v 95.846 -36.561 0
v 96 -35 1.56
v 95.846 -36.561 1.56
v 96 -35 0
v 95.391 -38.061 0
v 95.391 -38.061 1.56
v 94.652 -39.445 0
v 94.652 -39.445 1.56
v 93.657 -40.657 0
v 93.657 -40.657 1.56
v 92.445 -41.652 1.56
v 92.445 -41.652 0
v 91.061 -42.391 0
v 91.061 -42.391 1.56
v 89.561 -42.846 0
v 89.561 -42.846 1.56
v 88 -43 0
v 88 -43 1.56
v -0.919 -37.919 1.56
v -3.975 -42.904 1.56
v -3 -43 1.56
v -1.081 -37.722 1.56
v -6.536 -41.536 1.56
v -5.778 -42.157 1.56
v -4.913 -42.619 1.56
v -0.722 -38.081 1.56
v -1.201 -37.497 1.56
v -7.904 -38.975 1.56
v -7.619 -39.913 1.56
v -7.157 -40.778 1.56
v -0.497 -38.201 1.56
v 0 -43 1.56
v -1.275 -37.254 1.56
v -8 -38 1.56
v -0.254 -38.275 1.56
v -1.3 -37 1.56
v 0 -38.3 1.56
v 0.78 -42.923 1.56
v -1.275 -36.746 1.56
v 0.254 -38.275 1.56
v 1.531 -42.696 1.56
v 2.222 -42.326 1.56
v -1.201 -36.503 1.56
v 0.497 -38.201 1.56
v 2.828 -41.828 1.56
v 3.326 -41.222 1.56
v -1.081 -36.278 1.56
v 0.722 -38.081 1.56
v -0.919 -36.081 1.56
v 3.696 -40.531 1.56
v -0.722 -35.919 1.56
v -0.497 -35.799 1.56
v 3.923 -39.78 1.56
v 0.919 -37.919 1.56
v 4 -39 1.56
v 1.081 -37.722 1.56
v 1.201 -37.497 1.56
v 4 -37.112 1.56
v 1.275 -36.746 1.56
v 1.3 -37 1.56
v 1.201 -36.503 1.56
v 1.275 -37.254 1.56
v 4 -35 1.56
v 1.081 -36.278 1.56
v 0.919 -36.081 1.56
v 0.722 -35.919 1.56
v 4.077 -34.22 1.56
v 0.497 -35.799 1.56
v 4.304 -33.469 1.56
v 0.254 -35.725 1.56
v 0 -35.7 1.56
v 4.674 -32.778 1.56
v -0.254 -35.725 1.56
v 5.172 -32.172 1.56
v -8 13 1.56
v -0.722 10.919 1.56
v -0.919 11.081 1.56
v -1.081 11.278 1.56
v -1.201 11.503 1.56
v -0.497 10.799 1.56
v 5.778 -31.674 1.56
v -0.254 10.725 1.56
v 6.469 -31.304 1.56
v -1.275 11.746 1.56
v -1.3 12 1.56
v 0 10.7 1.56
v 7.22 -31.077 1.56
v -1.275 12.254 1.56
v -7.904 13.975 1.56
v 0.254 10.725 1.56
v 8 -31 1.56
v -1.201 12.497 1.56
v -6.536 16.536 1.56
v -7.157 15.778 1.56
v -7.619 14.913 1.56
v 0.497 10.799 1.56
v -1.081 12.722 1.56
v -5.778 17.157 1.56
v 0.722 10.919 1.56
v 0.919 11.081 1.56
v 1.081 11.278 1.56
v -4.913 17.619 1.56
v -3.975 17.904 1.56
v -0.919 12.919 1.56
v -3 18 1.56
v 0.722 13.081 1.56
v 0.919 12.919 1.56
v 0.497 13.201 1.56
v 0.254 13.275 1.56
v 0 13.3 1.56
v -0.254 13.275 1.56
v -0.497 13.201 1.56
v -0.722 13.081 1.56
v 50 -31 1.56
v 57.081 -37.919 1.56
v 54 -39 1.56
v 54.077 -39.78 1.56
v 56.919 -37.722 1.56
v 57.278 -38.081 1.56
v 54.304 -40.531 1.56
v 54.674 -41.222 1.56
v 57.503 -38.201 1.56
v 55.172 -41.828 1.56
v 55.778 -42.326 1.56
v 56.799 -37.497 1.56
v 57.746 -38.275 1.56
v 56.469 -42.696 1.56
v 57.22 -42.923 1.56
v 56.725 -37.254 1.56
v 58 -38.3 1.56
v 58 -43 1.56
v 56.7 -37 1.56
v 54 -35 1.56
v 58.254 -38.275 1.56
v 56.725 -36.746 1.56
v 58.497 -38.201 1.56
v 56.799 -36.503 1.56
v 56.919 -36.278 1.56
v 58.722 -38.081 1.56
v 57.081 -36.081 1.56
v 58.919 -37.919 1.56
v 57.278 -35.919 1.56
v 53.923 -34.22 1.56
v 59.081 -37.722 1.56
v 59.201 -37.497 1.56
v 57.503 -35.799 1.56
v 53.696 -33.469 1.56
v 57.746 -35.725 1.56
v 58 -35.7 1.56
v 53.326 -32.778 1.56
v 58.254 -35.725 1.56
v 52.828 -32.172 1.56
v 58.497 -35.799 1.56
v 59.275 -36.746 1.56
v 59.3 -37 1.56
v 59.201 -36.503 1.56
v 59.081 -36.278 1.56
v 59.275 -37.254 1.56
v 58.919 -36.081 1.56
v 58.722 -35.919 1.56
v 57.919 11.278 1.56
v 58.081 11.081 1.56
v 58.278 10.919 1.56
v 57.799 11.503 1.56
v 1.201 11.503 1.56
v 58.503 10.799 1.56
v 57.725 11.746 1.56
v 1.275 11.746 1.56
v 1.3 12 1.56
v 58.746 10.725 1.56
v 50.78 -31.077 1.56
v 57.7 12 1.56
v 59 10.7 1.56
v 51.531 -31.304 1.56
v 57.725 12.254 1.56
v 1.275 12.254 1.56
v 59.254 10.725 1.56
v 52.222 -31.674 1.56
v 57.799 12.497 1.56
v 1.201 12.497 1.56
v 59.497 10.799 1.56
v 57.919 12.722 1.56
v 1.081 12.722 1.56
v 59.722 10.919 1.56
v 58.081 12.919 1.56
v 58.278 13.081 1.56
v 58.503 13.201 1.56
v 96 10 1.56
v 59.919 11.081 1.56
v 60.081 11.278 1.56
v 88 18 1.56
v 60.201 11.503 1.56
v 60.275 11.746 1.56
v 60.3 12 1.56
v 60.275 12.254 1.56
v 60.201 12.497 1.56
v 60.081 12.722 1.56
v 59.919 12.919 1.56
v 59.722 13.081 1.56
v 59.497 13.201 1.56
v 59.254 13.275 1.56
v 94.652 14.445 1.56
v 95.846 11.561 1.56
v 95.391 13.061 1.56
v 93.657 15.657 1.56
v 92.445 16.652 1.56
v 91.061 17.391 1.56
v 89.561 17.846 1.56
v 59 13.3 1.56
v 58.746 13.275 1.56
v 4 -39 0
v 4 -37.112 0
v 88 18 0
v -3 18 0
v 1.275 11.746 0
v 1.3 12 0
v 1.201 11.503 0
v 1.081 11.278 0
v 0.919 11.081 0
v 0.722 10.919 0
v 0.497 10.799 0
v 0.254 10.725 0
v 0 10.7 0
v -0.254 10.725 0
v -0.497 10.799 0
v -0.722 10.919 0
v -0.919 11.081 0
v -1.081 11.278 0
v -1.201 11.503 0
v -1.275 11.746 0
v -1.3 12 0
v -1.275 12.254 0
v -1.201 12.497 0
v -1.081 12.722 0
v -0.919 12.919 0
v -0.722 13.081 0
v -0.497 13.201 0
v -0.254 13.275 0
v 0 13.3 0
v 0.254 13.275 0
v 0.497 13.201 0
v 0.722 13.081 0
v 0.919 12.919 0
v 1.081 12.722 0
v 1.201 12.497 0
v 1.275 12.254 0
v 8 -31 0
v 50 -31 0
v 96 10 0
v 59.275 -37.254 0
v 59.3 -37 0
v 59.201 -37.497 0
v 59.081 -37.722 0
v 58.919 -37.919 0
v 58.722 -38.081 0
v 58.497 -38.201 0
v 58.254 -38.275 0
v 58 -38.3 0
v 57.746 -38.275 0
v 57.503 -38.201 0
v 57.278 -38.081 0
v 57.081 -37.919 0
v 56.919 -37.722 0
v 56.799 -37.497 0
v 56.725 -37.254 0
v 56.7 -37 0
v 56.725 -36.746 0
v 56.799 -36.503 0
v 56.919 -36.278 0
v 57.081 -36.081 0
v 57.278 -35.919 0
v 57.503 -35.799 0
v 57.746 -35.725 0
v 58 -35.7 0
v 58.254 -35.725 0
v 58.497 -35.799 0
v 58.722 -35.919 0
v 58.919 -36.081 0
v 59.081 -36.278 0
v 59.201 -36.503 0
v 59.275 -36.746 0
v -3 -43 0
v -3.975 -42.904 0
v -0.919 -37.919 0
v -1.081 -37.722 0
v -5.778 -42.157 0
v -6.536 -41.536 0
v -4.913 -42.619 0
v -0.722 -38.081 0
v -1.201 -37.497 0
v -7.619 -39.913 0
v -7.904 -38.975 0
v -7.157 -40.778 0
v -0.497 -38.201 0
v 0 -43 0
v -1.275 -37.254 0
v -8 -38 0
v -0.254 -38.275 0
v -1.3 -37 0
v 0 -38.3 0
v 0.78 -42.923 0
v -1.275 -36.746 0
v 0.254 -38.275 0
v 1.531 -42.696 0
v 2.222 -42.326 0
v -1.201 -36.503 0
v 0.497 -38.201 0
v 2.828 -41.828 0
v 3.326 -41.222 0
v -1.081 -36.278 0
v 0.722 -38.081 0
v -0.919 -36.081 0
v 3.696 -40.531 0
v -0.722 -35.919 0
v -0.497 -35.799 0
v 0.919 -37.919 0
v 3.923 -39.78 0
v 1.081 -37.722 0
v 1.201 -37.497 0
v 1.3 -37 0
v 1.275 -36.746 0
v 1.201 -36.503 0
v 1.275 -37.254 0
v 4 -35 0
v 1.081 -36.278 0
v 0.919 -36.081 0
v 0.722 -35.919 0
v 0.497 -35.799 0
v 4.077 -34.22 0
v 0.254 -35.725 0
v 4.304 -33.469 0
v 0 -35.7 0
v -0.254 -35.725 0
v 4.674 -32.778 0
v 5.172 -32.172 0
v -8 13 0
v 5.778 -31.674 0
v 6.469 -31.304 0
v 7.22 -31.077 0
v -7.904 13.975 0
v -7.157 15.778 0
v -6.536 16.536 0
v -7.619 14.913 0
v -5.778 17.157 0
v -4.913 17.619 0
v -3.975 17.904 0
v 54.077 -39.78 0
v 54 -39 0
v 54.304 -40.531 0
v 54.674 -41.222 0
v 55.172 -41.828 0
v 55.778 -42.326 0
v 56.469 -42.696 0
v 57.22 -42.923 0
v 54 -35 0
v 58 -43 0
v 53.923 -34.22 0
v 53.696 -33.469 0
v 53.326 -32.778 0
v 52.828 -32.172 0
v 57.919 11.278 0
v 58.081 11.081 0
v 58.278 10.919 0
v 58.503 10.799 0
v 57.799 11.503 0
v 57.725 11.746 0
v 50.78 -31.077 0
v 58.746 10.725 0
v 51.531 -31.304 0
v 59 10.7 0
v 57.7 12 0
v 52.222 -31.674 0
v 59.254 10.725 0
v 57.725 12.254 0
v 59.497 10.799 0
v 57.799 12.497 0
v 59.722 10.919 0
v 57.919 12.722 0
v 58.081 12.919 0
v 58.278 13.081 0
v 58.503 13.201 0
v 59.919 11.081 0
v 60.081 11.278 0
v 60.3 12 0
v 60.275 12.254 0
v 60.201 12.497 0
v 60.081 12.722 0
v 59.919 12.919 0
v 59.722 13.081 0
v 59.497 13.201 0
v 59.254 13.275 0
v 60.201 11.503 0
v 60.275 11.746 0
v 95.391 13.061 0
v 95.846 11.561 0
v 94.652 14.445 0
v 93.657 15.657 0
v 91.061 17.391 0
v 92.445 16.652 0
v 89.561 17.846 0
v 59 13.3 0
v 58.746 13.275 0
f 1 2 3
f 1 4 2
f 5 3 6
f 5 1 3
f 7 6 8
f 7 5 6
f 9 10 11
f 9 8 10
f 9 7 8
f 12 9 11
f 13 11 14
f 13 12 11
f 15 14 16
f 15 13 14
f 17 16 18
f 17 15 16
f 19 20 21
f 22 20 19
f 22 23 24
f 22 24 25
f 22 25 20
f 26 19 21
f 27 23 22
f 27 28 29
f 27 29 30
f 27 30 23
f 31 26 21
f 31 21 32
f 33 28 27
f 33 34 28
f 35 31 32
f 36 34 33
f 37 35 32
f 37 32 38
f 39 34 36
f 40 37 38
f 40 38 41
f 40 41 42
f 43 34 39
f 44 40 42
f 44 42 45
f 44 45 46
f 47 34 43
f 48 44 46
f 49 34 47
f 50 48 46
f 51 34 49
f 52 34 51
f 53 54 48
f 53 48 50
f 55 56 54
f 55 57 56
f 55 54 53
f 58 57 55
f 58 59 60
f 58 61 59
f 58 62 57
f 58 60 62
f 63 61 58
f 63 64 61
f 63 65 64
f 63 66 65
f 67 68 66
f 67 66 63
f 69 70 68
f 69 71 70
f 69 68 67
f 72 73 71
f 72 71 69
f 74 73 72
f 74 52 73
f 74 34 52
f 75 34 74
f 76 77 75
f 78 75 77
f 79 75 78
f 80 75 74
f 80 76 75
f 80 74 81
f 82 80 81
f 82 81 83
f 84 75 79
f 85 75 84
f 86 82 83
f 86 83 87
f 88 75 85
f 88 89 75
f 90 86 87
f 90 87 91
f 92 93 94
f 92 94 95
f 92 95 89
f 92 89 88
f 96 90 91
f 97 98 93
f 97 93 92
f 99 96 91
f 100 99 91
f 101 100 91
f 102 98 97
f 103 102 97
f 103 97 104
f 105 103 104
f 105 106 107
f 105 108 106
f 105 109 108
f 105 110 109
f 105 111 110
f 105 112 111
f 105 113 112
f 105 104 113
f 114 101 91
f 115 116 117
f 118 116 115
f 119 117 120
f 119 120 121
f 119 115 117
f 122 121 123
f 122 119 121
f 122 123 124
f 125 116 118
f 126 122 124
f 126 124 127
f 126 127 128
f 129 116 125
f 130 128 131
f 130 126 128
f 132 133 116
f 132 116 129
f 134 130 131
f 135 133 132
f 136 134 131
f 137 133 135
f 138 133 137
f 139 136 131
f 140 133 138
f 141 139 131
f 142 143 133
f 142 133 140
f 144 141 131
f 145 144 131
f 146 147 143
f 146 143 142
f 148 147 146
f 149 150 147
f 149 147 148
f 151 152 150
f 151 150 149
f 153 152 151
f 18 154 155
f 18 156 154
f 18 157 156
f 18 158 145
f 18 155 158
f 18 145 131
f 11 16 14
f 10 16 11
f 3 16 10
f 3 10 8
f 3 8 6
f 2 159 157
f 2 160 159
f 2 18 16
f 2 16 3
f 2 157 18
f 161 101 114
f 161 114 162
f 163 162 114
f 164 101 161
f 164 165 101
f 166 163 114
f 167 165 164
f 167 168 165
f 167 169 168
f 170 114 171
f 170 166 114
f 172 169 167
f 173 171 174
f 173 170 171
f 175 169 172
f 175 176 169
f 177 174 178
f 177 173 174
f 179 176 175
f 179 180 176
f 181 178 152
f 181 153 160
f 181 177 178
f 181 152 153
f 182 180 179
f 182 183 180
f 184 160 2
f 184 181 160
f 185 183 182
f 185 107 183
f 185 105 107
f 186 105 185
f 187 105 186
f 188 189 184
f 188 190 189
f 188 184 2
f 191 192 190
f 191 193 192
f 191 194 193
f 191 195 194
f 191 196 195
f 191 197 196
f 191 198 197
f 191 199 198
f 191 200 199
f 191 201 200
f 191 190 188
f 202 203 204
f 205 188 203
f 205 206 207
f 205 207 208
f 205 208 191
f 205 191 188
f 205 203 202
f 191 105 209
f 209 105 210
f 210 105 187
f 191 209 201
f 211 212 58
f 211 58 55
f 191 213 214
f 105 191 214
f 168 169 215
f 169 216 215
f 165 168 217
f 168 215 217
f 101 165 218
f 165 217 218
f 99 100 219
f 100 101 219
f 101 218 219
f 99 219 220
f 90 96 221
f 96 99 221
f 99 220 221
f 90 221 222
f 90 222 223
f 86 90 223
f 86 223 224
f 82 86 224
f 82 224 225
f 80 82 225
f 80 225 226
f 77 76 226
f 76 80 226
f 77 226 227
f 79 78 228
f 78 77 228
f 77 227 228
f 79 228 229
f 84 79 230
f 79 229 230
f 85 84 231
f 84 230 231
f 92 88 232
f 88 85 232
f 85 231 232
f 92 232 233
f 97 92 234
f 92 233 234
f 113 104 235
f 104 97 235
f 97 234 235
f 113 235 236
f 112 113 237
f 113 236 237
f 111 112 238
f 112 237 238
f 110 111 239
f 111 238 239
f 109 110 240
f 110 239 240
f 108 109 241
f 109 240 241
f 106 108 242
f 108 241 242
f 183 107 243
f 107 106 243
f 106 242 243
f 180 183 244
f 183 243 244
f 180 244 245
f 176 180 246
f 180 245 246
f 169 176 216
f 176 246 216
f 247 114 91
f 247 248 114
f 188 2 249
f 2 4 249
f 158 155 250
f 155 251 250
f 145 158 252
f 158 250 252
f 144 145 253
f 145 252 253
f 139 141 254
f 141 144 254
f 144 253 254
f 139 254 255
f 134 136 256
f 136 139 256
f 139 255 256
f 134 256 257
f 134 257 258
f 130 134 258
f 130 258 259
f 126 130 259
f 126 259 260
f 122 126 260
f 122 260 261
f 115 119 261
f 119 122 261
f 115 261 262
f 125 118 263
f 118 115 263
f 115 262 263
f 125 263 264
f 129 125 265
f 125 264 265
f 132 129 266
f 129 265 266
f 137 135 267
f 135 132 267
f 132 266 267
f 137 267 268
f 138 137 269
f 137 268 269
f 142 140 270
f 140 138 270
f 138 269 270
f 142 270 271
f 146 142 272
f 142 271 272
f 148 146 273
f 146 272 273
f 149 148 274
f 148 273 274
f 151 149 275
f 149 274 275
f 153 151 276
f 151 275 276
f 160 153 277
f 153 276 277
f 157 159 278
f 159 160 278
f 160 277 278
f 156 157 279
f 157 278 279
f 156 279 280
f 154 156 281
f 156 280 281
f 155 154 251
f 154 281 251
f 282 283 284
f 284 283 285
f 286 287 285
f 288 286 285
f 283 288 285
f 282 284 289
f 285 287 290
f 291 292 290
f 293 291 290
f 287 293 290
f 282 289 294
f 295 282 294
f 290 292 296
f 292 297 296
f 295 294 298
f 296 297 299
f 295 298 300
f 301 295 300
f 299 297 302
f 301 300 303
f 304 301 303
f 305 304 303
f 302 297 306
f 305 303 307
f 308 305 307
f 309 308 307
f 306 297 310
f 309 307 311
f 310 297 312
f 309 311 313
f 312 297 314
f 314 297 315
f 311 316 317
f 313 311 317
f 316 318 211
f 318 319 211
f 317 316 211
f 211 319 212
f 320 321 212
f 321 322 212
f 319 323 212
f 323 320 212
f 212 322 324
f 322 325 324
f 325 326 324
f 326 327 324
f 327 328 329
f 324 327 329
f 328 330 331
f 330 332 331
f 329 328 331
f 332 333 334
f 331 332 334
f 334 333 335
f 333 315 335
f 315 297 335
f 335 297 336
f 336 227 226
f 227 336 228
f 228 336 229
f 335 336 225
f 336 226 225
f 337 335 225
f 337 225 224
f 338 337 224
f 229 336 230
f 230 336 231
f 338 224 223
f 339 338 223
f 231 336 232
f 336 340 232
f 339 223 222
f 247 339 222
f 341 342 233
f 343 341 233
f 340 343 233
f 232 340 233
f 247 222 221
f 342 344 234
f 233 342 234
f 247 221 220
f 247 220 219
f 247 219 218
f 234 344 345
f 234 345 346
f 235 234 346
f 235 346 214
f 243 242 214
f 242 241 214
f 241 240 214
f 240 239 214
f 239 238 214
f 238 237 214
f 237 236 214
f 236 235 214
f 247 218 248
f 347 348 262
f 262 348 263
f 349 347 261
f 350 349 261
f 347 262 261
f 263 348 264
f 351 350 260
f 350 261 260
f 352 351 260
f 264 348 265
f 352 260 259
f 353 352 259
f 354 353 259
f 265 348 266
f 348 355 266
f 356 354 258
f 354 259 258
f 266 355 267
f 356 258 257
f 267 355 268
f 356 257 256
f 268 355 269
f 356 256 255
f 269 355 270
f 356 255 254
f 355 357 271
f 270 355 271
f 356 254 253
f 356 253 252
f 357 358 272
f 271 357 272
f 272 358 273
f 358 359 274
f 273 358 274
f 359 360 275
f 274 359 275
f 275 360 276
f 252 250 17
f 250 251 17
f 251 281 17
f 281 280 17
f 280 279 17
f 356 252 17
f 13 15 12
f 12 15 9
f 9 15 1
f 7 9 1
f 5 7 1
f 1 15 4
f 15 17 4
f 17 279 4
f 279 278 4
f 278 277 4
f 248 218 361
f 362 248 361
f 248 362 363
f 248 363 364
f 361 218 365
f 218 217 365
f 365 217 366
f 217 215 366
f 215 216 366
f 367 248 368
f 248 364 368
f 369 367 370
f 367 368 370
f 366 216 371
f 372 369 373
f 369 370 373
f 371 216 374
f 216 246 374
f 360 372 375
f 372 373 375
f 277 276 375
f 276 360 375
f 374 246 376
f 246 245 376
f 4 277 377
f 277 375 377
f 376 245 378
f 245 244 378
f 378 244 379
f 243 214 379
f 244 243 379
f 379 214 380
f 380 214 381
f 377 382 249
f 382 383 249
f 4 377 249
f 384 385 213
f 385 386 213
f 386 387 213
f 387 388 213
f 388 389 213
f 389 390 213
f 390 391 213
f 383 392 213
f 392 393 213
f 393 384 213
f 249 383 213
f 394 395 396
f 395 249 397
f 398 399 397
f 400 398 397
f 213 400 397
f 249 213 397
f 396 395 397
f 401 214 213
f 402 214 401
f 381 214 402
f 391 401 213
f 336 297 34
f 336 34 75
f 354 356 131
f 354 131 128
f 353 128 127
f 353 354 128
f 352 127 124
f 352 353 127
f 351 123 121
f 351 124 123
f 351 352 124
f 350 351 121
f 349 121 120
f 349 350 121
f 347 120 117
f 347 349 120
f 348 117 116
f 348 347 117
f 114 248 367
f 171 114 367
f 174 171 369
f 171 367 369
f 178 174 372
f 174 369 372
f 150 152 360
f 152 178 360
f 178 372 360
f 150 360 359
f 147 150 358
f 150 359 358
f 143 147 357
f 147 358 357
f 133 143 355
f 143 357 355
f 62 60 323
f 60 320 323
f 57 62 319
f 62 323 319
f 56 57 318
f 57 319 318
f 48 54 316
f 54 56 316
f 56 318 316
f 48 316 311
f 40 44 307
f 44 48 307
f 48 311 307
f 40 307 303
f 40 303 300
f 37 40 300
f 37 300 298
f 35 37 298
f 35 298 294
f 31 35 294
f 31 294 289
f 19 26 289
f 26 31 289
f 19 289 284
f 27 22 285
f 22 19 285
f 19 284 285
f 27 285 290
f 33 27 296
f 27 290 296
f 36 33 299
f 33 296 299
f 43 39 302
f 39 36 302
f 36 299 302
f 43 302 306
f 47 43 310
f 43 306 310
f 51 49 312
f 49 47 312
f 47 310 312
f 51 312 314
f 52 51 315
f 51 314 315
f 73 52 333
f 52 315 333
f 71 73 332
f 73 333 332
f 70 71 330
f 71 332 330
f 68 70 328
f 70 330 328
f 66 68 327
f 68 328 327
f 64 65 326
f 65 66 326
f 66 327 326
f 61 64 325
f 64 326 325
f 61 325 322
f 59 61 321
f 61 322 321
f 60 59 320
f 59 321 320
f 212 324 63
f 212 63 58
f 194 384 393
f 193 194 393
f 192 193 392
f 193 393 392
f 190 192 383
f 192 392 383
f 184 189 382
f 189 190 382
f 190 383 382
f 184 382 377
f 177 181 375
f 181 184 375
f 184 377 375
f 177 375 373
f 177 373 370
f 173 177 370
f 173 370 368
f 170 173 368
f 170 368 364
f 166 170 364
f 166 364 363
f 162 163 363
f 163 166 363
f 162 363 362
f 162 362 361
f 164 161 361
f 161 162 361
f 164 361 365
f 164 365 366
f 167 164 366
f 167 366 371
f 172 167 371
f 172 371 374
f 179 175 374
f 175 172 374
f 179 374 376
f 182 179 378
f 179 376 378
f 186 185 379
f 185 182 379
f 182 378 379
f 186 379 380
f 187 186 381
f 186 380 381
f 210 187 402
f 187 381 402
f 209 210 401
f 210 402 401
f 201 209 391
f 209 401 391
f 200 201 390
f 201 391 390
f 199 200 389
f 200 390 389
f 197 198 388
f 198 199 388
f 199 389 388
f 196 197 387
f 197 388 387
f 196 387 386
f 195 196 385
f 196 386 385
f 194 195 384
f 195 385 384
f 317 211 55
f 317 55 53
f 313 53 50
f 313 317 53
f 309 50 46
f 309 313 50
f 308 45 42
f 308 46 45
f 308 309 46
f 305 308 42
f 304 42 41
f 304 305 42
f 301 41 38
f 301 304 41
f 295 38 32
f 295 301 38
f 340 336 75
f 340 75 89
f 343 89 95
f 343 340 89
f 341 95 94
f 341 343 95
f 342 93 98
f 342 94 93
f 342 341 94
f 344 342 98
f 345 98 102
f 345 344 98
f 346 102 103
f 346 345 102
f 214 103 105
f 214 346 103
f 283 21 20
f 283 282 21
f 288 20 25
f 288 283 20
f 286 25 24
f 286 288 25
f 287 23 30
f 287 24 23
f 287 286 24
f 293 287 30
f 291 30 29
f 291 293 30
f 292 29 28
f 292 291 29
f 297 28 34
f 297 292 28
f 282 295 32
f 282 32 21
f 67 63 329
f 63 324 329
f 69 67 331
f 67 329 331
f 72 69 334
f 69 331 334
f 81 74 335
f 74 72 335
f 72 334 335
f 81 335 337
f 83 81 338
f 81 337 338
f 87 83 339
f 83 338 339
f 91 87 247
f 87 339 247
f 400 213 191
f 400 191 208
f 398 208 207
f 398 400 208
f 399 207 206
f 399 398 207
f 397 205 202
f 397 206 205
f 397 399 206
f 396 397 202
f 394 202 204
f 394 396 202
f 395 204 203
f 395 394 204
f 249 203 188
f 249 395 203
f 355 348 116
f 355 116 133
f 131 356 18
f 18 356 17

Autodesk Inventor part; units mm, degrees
ref_plane "YZ Plane" through (0, 0, 0) normal (1, 0, 0) x (0, 1, 0)
ref_plane "XZ Plane" through (0, 0, 0) normal (0, 1, 0) x (-1, 0, 0)
ref_plane "XY Plane" through (0, 0, 0) normal (0, 0, 1) x (1, 0, 0)
sketch "Sketch1" plane through (0, 0, 0) normal (0, 0, 1) x (1, 0, 0)
  line L0 (96, -35) -> (96, 10)
  arc A0 (88, -43) -> (96, -35) centre (88, -35) ccw
  line L1 (54, -39) -> (54, -35)
  line L2 (50, -31) -> (8, -31)
  line L3 (4, -35) -> (4, -37.1118)
  line L4 (58, -43) -> (88, -43)
  arc A1 (8, -31) -> (4, -35) centre (8, -35) ccw
  arc A2 (54, -39) -> (58, -43) centre (58, -39) ccw
  arc A3 (54, -35) -> (50, -31) centre (50, -35) ccw
  line L5 (-34, 0) -> (96, 0) construction
  line L6 (88, 18) -> (-3, 18)
  circle A4 centre (59, 12) radius 1.3
  circle A5 centre (58, -37) radius 1.3
  line L7 (4, -37.1118) -> (4, -39)
  arc A6 (0, -43) -> (4, -39) centre (0, -39) ccw
  circle A7 centre (0, -37) radius 1.3
  line L8 (58, -37) -> (0, -37) construction
  line L9 (0, 0) -> (0, 18) construction
  line L10 (0, -43) -> (-3, -43)
  line L11 (-8, -38) -> (-8, 13)
  arc A8 (-3, 18) -> (-8, 13) centre (-3, 13) ccw
  arc A9 (-8, -38) -> (-3, -43) centre (-3, -38) ccw
  arc A10 (96, 10) -> (88, 18) centre (88, 10) ccw
  circle A11 centre (0, 12) radius 1.3
  point P0 (4, -43)
  point P1 (96, 18)
  point P2 (54, -31)
  point P3 (4, -31)
  dimension "d8" = 50
  dimension "d11" = 12
  dimension "d13" = 4
  dimension "d16" = 42
  dimension "d33" = 4
  dimension "d44" = 58
  dimension "d46" = 31
  dimension "d47" = 18
  dimension "d51" = 5
  dimension "d52" = 12
  dimension "d55" = 58
  dimension "d57" = 49
  dimension "d58" = 6
  dimension "d59" = 37
  dimension "d60" = 2.6
  dimension "d61" = 8
  dimension "d62" = 8
  dimension "d64" = 4
extrude "Extrusion1" add sketch "Sketch1" along normal blind 1.56
properties part number "long_battery_mount"
